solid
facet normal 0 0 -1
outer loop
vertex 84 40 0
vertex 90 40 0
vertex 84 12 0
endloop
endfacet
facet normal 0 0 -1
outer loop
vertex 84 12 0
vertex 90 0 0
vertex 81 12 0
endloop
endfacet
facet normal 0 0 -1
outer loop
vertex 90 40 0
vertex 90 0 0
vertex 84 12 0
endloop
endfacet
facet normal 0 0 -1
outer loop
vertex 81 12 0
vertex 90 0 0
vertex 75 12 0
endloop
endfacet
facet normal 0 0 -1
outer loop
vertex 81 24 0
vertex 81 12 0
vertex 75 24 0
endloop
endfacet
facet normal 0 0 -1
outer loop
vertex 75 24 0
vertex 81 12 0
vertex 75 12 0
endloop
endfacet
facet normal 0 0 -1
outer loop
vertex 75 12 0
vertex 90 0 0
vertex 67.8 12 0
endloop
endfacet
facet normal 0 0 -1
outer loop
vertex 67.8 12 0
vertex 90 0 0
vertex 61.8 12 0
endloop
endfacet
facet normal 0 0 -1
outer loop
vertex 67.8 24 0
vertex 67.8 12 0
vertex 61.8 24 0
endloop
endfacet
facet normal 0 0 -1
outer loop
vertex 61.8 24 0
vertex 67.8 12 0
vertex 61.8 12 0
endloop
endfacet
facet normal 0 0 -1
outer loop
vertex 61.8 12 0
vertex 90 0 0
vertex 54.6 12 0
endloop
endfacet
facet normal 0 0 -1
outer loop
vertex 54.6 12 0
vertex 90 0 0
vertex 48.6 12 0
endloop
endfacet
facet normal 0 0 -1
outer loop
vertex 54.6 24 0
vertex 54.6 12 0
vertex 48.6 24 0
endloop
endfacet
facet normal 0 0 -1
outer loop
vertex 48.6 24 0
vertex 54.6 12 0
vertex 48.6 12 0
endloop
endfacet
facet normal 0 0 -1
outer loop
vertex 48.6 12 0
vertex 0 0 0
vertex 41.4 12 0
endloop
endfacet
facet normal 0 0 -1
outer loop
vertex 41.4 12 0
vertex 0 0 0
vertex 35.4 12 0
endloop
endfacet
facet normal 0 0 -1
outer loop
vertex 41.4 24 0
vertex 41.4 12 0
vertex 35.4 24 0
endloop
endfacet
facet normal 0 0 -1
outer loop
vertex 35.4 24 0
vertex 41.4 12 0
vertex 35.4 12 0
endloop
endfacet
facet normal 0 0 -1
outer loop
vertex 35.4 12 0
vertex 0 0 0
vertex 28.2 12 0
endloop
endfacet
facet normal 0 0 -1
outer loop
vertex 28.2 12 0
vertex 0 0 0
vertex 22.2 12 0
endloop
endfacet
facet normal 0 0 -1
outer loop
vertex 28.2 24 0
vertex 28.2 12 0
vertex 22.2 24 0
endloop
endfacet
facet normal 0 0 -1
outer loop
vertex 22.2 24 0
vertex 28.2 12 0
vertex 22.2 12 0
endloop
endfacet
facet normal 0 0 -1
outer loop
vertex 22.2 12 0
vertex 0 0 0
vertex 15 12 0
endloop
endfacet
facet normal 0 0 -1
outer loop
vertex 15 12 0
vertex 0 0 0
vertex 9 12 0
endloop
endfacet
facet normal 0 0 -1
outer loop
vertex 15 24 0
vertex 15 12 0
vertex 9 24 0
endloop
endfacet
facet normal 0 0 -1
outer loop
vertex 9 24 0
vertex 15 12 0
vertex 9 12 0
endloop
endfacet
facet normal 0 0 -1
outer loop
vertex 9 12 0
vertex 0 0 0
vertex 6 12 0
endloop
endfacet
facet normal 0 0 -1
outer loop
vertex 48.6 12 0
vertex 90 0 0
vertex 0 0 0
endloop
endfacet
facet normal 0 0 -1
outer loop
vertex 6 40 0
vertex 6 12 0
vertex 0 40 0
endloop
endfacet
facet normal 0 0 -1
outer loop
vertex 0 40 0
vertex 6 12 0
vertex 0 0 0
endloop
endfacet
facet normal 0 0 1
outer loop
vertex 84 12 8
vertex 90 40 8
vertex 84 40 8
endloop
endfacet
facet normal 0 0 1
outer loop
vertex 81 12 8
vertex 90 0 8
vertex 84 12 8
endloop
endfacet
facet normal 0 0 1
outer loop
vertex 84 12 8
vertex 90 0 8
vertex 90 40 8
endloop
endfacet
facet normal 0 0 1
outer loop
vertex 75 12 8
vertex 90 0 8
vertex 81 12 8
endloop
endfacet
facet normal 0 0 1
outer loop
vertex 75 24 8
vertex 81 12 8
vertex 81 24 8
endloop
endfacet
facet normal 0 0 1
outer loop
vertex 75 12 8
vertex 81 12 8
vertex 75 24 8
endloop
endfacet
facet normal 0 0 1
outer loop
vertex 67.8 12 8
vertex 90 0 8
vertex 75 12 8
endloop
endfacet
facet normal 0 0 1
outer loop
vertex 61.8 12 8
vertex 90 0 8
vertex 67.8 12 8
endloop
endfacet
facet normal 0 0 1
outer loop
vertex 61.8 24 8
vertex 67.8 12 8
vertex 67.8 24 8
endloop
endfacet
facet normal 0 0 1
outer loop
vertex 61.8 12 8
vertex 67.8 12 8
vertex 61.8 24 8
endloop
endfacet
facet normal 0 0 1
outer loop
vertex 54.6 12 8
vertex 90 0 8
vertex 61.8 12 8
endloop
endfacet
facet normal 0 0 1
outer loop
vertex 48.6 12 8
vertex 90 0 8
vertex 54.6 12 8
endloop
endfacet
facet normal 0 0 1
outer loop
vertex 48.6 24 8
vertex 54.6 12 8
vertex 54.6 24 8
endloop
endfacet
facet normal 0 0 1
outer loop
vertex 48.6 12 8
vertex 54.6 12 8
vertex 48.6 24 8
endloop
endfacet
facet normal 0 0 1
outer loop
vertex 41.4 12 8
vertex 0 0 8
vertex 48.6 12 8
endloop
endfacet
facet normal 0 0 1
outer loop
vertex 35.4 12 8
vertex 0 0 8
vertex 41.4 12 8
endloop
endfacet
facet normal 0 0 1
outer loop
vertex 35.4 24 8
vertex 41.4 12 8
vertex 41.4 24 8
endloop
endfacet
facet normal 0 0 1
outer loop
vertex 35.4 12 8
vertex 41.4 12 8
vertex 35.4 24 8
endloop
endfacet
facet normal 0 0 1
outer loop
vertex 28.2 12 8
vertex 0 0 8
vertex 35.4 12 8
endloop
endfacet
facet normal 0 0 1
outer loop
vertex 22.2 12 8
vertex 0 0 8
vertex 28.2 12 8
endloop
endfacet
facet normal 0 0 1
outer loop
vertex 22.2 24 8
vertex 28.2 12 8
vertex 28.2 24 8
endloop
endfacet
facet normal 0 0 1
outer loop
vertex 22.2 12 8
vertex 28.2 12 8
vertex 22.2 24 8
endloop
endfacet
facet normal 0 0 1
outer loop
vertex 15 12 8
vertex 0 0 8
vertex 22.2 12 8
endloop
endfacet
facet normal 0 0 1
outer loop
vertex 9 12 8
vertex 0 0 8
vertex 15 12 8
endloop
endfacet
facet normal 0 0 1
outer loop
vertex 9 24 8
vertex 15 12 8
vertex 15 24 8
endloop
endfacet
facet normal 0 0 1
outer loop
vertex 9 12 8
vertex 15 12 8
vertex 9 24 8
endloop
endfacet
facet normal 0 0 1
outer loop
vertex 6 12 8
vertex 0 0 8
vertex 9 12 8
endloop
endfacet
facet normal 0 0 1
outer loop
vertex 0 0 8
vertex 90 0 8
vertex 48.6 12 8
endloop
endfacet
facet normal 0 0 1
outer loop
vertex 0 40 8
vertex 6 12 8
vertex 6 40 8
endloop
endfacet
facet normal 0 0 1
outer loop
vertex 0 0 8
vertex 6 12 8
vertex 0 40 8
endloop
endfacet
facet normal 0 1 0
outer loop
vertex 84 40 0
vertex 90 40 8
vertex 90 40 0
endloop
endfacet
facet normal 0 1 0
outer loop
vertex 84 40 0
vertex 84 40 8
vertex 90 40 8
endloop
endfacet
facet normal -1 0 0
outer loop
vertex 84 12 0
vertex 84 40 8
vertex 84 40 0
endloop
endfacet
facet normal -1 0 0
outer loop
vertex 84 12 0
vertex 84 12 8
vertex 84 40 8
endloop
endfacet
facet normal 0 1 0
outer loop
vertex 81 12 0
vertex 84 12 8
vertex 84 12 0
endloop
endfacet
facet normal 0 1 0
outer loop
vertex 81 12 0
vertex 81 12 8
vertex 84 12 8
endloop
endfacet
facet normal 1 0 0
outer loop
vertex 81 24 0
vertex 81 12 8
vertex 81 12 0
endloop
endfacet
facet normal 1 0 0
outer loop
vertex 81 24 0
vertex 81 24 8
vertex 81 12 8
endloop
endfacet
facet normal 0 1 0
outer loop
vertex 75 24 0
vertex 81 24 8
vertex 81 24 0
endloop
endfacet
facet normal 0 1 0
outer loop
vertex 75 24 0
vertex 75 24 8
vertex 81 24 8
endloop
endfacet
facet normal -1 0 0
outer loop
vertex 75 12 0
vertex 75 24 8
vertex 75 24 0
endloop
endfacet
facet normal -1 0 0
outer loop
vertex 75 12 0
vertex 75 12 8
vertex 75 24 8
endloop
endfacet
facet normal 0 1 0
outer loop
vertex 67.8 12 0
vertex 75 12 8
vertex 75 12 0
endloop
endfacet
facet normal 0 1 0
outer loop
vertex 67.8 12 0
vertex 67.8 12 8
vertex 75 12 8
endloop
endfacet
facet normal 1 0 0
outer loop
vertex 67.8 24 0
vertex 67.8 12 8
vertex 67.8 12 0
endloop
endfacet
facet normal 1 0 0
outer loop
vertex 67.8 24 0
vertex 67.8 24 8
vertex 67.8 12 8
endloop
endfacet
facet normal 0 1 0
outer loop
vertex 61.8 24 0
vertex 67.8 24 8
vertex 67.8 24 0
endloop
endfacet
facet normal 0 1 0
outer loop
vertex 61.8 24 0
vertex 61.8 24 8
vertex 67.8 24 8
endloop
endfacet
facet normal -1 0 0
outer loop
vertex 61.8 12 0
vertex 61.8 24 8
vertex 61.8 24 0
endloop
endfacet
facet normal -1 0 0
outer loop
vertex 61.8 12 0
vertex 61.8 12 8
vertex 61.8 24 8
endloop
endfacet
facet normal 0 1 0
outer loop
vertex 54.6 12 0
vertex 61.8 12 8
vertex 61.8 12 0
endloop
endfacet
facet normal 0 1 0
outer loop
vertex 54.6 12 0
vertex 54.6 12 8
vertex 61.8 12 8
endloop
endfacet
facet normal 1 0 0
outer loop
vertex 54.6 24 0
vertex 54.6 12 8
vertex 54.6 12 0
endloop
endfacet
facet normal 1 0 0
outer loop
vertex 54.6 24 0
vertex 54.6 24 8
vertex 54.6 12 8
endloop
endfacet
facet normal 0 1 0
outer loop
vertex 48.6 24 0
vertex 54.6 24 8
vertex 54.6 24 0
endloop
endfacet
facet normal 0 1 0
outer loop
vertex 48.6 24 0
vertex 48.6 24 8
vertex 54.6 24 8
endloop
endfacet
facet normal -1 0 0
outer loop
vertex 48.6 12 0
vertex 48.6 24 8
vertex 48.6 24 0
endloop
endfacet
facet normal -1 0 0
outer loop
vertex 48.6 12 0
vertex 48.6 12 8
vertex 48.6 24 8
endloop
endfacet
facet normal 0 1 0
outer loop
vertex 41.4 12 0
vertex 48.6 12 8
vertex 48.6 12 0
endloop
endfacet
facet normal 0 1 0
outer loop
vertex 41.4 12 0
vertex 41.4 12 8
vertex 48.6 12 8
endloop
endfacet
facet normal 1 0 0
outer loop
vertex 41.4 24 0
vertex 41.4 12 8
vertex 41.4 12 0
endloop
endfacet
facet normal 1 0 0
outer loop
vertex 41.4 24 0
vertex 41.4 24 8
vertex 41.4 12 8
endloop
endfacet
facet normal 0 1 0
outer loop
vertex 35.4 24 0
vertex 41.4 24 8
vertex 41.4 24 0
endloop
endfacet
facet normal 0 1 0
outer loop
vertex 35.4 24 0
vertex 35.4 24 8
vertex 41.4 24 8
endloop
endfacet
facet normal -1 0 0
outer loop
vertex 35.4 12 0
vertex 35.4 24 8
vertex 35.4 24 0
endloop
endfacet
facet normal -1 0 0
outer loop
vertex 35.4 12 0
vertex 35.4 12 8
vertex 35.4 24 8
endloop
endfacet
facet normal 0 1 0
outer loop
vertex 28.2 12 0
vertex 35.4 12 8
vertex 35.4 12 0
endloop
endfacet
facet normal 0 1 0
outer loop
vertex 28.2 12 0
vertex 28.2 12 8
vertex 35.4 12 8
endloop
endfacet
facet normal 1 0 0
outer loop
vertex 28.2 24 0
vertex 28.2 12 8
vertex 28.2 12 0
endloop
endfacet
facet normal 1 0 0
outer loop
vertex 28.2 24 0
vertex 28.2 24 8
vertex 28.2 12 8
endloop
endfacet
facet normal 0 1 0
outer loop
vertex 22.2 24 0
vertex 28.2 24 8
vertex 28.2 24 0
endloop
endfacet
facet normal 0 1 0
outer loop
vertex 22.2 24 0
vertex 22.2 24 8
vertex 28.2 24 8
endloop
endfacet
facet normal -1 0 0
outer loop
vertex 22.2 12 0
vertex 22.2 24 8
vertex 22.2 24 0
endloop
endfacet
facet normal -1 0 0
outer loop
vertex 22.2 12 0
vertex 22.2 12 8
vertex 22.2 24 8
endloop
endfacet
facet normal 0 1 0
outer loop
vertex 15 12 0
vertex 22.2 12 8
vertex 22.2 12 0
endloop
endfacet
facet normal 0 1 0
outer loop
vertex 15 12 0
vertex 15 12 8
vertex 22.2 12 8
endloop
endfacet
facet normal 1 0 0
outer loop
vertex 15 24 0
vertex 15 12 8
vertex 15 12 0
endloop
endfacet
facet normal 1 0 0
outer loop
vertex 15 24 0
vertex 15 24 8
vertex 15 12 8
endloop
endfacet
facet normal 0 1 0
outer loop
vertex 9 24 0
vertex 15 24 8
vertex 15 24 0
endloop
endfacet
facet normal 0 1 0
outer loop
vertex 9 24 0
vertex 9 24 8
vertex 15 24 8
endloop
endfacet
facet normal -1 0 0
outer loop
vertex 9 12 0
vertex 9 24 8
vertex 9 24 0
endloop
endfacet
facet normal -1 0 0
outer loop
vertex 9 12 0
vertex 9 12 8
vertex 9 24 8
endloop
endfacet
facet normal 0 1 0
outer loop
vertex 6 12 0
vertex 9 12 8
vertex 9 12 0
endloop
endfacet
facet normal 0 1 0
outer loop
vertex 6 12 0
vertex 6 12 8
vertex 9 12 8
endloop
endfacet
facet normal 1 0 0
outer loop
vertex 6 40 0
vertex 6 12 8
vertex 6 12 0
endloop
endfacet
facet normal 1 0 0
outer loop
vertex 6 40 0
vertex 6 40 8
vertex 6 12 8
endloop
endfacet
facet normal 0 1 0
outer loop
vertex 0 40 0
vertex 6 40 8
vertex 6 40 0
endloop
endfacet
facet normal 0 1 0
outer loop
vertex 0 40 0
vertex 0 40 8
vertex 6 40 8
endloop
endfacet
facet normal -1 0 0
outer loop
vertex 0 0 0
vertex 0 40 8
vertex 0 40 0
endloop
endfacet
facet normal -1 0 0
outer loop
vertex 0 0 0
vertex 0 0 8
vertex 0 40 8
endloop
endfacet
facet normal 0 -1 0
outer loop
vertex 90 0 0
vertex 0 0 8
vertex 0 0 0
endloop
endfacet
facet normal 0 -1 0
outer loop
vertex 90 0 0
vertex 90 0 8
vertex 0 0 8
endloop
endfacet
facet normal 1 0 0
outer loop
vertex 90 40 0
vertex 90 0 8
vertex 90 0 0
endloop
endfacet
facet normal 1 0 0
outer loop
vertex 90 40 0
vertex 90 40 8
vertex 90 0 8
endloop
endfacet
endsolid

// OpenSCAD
$fn = 32;

// ----------------------------------------------------------------------
// Guard grille: 6 slats over a 90 x 40 mm plate
// ----------------------------------------------------------------------

// --- parameters (mm) ---
profile_height = 8;       // extrusion height
profile_points = 32;      // points of the closed outline

profile = [[0, 0], [90, 0], [90, 40], [84, 40], [84, 12], [81, 12], [81, 24], [75, 24], [75, 12], [67.8, 12], [67.8, 24], [61.8, 24], [61.8, 12], [54.6, 12], [54.6, 24], [48.6, 24], [48.6, 12], [41.4, 12], [41.4, 24], [35.4, 24], [35.4, 12], [28.2, 12], [28.2, 24], [22.2, 24], [22.2, 12], [15, 12], [15, 24], [9, 24], [9, 12], [6, 12], [6, 40], [0, 40]];  // single closed polygon, 32 points, counter clockwise

// --- the one profile operation ---
linear_extrude(height = profile_height) polygon(points = profile);
